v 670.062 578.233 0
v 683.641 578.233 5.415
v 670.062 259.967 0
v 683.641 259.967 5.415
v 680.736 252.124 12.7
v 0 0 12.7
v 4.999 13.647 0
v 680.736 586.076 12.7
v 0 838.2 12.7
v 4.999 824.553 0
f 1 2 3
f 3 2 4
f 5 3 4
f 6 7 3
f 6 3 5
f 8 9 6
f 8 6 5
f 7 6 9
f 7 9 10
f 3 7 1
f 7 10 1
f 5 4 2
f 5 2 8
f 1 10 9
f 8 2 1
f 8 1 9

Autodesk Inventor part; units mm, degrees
ref_plane "YZ Plane" through (0, 0, 0) normal (1, 0, 0) x (0, 1, 0)
sketch "Sketch1" plane through (0, 0, 0) normal (0, 0, 1) x (1, 0, 0)
  line L0 (0, 0) -> (685.8, 0)
  line L1 (685.8, 0) -> (685.8, 838.2)
  line L2 (685.8, 838.2) -> (0, 838.2)
  line L3 (0, 838.2) -> (0, 0)
  line L4 (685.8, 254) -> (787.4, 254) construction
  line L5 (787.4, 254) -> (787.4, 584.2) construction
  line L6 (787.4, 584.2) -> (685.8, 584.2) construction
  line L7 (0, 838.2) -> (685.8, 584.2)
  line L8 (0, 0) -> (685.8, 254)
  dimension "d0" = 685.8
  dimension "d1" = 838.2
  dimension "d2" = 101.6
  dimension "d3" = 330.2
  dimension "d4" = 254
extrude "Extrusion1" add sketch "Sketch1" along normal blind 12.7 contours L3 L7 L1 L8
sketch "Sketch2" plane through (0, 0, 0) normal (-1, 0, 0) x (0, 0, 1)
  line L0 (12.7, 838.2) -> (12.7, 0) projected
  line L1 (12.7, 0) -> (0, 11.7954)
  line L2 (0, 838.2) -> (0, 0) projected
  line L3 (12.7, 0) -> (30.0327, 0) construction
  line L4 (12.7, 838.2) -> (0, 825.5)
  line L5 (12.7, 838.2) -> (30.6605, 838.2) construction
  line L6 (0, 838.2) -> (12.7, 838.2) projected
  line L7 (12.7, 838.2) -> (0, 838.2)
  line L8 (0, 838.2) -> (0, 825.5)
  line L9 (0, 0) -> (12.7, 0) projected
  line L10 (12.7, 0) -> (0, 0)
  line L11 (0, 0) -> (0, 11.7954)
  dimension "d7" = 137.115
  dimension "d8" = 135
sketch "Sketch3" plane through (685.8, 254, 0) normal (1, 0, 0) x (0, 0, -1)
  line L0 (-12.7, -254) -> (-12.7, 0) projected
  line L1 (-12.7, 0) -> (0, 11.7954)
  line L2 (0, 0) -> (0, 330.2) projected
  line L3 (-12.7, 0) -> (4.6327, 0) construction
  line L4 (0, 11.7954) -> (0, 0)
  line L5 (0, 0) -> (-12.7, 0)
  line L6 (-12.7, 0) -> (-12.7, 330.2) projected
  line L7 (-12.7, 330.2) -> (0, 316.526)
  line L8 (0, 316.526) -> (0, 330.2)
  line L9 (0, 330.2) -> (-12.7, 330.2)
  point P0 (0, -254)
  dimension "d9" = 42.885
loft "Loft1" cut profiles "Sketch3", "Sketch2" contours L1 L2 L5 / L9 L2 L1
sketch "Sketch4" plane through (685.8, 584.2, 12.7) normal (1, 0, 0) x (0, 0, -1)
  line L0 (0, 0) -> (0, 254) projected
  line L1 (0, 0) -> (12.7, -11.7954)
  line L2 (12.7, -318.4046) -> (12.7, 0) projected
  line L3 (0, 0) -> (17.3327, 0) construction
  line L4 (12.7, -11.7954) -> (12.7, 0)
  line L5 (12.7, 0) -> (0, 0)
  point P0 (12.7, -584.2)
  dimension "d14" = 42.885
sketch "Sketch5" plane through (0, 11.7954, 0) normal (-1, 0, 0) x (0, 0, 1)
  line L0 (0, 826.4046) -> (12.7, 826.4046) projected
  line L1 (12.7, 826.4046) -> (0, 814.6093)
  line L2 (0, 572.4046) -> (0, 826.4046) projected
  line L3 (12.7, 826.4046) -> (30.0327, 826.4046) construction
  line L4 (0, 814.6093) -> (0, 826.4046)
  line L5 (0, 826.4046) -> (12.7, 826.4046)
  point P0 (0, -11.7954)
  dimension "d15" = 137.115
loft "Loft2" cut profiles "Sketch5", "Sketch4"
ref_plane "Work Plane1" through (685.8, 0, 0) normal (0.923076, 0, -0.3846176) x (0, 1, 0)
ref_plane "Work Plane2" through (0, 419.1, 0) normal (0, 1, 0) x (-1, 0, 0)
sketch "Sketch7" plane through (0, 419.1, 0) normal (0, 1, 0) x (-1, 0, 0)
  line L0 (-685.8, 0) -> (0, 0) projected
  line L1 (-685.8, 0) -> (-680.7358, 12.7)
  line L2 (0, 12.7) -> (-685.8, 12.7) projected
  line L3 (-685.8, 0) -> (-672.1275, 0) construction
  line L4 (-680.7358, 12.7) -> (-685.8, 12.7)
  line L5 (-685.8, 12.7) -> (-685.8, 0)
  dimension "d26" = 68.26
extrude "Extrusion3" cut sketch "Sketch7" against normal through all both and the other way through all
sketch "Sketch8" plane through (0, 419.1, 0) normal (0, 1, 0) x (-1, 0, 0)
  line L0 (-685.8, 0) -> (0, 0) projected
  line L1 (0, 0) -> (14.0129, 0) construction
  line L2 (0, 12.7) -> (-680.7358, 12.7) projected
  line L3 (0, 12.7) -> (-4.9988, 0)
  line L4 (0, 12.7) -> (13.6484, 12.7) construction
  line L5 (-4.9988, 0) -> (0, 0)
  line L6 (0, 12.7) -> (0, 0)
  dimension "d32" = 111.485
extrude "Extrusion4" cut sketch "Sketch8" against normal through all both and the other way through all
sketch "Sketch10" plane through (680.7358, 252.1244, 12.7) normal (0.9288742, 0, 0.3703953) x (0.3703953, 0, -0.9288742)
  line L0 (13.6725, 13.671) -> (13.6725, 320.2803) projected
  line L1 (13.6725, 345.6803) -> (7.8432, 345.6803)
  line L2 (7.8432, 345.6803) -> (7.8432, -11.729)
  line L3 (7.8432, -11.729) -> (13.6725, -11.729)
  line L4 (13.6725, -11.729) -> (13.6725, 345.6803)
  point P0 (-240.3446, -252.1244)
  point P1 (13.6725, 13.671)
  point P2 (13.6725, 320.2803)
  dimension "d37" = 5.8293
  dimension "d38" = 25.4
  dimension "d39" = 25.4
extrude "Extrusion6" cut sketch "Sketch10" against normal through all
sketch "Sketch12" plane through (0, 0, 12.7) normal (0, 0, 1) x (1, 0, 0)
  line L0 (-105.2786, 838.8792) -> (769.6918, 838.8792) construction
  line L1 (769.6918, 838.8792) -> (769.6918, -36.0911) construction
  line L2 (769.6918, -36.0911) -> (-105.2786, -36.0911) construction
  line L3 (-105.2786, -36.0911) -> (-105.2786, 838.8792) construction
  point P0 (0, 0)
properties part number "Wind Tunnel Inlet Body Single Panel Graphic Only" material "Wood (Oak)"
